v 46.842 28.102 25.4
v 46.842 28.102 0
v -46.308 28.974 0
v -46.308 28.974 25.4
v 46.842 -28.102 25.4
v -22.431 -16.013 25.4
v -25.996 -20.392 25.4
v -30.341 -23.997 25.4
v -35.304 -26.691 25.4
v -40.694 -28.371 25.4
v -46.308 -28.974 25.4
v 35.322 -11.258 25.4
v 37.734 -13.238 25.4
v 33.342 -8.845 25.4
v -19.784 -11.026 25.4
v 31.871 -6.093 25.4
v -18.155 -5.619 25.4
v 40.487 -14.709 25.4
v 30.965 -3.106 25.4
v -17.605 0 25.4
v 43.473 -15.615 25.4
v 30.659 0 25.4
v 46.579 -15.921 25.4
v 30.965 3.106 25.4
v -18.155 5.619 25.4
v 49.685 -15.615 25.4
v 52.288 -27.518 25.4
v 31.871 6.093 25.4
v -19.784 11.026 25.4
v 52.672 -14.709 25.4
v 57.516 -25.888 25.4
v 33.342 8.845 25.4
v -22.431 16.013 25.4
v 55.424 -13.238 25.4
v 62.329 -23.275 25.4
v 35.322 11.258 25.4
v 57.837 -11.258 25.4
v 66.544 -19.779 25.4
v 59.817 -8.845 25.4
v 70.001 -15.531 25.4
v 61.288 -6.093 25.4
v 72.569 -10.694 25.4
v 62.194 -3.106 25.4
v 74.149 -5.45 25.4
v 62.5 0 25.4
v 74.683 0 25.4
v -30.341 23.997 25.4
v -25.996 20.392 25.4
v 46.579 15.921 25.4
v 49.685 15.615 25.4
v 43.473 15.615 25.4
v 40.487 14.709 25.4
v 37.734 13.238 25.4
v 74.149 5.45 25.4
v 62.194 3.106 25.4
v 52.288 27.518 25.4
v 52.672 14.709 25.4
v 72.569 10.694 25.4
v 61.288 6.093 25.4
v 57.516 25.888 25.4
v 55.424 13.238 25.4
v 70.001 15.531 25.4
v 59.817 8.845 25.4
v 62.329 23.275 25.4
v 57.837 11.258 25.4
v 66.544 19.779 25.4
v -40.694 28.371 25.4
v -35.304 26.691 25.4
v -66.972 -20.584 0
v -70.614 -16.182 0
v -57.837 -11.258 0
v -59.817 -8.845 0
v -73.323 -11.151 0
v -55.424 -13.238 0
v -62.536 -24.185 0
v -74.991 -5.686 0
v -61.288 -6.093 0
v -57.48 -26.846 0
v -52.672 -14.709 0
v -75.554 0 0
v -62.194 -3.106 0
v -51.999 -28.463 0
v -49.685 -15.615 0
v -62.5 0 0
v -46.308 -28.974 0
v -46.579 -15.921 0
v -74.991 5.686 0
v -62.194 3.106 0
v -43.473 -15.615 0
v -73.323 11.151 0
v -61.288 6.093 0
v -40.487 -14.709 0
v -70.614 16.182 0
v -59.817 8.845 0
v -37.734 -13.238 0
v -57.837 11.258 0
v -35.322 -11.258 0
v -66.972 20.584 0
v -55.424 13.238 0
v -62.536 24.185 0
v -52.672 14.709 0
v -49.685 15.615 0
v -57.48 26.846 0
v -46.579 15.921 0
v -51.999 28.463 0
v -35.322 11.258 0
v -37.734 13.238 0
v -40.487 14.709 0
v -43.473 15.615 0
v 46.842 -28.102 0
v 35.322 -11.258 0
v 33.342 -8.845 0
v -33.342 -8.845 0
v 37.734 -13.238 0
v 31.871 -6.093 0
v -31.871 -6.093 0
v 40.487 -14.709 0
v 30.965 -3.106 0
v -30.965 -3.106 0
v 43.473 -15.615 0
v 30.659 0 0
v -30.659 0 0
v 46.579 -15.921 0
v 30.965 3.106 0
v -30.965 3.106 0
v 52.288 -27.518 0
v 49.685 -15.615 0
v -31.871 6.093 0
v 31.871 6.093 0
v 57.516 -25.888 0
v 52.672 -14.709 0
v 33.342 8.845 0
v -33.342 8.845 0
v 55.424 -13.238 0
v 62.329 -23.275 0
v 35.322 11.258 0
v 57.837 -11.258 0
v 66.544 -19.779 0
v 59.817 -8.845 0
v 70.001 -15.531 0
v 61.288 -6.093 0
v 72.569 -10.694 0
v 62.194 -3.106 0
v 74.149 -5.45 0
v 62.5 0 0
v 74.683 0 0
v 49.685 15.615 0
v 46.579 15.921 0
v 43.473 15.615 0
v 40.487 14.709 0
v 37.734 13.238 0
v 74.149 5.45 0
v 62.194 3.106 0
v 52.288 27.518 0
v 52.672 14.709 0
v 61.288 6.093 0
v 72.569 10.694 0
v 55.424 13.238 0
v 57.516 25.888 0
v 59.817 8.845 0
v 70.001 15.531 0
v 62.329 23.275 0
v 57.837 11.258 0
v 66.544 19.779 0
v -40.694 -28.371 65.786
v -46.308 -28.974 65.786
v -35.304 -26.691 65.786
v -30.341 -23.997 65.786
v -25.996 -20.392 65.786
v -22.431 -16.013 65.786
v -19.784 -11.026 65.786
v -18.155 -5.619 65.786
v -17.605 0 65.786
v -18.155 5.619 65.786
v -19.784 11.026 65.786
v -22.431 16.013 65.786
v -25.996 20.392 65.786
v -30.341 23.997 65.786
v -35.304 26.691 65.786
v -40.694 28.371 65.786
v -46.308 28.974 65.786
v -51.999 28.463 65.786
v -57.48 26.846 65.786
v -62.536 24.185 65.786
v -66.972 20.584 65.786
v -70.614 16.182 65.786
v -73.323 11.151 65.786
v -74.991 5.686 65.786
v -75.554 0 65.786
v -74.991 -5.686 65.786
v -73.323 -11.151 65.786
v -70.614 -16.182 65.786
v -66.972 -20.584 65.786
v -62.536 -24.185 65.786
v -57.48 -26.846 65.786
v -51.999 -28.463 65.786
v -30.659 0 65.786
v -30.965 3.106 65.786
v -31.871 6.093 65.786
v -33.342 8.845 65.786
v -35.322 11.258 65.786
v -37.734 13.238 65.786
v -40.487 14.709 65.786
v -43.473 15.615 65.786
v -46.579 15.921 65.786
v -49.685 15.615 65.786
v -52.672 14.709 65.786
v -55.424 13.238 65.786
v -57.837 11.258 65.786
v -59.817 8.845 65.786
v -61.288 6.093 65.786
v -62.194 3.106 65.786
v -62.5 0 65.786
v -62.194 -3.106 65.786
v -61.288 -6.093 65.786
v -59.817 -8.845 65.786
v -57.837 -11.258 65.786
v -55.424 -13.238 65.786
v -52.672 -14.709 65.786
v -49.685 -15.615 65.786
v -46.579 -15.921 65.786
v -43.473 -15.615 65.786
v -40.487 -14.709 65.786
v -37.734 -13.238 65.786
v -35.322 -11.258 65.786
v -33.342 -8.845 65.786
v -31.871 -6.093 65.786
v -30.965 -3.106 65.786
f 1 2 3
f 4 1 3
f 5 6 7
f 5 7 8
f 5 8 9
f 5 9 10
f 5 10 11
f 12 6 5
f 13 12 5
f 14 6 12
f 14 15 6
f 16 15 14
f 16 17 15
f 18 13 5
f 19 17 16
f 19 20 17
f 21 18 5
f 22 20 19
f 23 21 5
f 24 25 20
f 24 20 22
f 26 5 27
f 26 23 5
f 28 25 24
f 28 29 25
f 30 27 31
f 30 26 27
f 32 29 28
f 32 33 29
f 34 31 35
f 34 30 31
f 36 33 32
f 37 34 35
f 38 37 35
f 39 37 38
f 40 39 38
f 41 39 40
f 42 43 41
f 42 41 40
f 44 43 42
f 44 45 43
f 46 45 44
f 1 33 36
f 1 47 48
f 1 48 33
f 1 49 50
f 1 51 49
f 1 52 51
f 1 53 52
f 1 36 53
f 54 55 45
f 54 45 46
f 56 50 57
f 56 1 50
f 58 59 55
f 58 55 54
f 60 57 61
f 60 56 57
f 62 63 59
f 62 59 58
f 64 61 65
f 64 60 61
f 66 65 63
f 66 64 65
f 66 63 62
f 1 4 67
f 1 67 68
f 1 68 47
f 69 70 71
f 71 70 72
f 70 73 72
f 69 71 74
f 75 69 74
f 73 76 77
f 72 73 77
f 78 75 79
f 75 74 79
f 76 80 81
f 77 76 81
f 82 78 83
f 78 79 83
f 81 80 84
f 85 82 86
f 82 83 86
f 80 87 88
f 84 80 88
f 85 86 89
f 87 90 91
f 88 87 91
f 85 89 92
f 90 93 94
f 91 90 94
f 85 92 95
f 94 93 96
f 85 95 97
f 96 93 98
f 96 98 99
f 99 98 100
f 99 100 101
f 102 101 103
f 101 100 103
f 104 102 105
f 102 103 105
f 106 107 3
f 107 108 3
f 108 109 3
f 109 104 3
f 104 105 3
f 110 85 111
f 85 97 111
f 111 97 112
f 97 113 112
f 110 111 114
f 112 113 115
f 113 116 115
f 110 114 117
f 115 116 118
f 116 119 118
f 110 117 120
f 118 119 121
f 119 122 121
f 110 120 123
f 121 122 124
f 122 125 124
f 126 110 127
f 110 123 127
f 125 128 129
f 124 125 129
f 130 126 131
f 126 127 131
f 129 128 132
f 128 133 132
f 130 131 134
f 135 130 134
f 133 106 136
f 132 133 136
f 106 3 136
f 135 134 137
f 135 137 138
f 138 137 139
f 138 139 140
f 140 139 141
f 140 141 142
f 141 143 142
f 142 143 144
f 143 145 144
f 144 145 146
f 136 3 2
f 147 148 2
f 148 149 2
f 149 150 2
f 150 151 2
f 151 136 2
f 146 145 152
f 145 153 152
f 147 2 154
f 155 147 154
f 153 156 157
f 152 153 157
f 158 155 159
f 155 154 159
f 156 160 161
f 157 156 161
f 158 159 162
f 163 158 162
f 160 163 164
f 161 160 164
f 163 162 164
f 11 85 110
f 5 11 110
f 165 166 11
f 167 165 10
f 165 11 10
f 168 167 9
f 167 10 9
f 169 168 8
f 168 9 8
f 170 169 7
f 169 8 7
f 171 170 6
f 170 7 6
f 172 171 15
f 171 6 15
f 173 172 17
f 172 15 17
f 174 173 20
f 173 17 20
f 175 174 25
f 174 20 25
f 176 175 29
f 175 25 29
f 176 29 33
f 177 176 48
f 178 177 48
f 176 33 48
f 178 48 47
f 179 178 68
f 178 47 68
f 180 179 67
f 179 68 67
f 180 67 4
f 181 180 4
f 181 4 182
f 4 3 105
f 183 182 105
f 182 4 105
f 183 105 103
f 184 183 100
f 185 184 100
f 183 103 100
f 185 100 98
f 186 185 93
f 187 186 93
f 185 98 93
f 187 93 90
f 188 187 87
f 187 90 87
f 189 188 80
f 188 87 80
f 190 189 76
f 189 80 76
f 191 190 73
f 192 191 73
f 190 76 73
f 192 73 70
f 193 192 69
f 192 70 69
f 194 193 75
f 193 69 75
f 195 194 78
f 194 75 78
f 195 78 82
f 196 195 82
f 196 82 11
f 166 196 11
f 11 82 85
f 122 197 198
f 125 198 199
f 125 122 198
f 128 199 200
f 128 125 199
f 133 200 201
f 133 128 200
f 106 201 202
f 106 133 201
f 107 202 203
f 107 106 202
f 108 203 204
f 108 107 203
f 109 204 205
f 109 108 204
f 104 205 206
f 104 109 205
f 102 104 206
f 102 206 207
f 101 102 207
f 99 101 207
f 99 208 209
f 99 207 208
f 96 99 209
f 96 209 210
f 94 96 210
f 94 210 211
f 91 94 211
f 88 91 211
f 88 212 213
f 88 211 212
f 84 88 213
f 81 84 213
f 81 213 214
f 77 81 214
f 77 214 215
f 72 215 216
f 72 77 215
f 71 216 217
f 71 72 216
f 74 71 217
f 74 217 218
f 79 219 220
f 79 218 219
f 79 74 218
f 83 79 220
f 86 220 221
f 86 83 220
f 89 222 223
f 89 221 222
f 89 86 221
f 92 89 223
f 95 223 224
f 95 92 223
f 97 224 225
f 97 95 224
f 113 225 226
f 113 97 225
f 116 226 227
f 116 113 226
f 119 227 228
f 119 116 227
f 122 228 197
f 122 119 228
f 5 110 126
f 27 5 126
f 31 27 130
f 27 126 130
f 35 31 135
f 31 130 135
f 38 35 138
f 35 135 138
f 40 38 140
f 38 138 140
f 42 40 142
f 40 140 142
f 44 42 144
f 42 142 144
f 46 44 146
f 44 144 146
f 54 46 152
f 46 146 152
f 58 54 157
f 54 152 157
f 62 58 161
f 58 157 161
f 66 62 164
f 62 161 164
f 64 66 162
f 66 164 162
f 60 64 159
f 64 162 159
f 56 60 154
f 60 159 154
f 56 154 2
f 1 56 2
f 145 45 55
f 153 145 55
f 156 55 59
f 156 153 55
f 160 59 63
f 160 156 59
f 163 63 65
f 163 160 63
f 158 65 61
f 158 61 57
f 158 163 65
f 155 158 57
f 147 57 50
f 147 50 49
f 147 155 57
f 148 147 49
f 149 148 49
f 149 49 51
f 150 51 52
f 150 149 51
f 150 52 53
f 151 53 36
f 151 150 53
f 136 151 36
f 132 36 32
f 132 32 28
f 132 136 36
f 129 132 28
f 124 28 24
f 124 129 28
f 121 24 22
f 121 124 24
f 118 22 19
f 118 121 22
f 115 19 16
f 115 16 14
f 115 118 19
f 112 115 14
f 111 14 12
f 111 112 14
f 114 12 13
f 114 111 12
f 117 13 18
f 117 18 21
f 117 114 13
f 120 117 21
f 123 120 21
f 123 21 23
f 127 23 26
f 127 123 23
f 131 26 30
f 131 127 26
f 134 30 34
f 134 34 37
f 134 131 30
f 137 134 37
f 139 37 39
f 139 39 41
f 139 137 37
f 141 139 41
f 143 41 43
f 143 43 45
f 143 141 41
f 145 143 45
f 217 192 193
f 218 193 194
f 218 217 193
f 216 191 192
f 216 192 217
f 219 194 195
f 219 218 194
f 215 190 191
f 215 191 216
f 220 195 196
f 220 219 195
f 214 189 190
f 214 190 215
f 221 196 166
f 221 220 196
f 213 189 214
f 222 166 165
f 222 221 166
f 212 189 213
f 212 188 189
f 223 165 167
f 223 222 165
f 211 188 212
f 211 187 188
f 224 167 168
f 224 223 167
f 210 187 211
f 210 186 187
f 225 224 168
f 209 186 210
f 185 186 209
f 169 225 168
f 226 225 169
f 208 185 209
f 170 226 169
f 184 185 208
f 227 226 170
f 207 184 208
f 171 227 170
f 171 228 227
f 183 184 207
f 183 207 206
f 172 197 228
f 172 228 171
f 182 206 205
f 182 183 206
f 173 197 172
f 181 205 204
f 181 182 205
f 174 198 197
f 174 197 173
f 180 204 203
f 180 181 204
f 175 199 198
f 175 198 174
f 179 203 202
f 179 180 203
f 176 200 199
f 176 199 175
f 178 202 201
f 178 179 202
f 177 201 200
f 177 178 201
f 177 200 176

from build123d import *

# Parameters (mm, degrees)
F0_R     = 15.920661
F1_DEPTH = 25.4
F2_DEPTH = 65.786
F3_DEPTH = 76.2
F4_DEPTH = 61.214


with BuildPart() as f1:
    # F0 (on Top) → F1 (new body)
    with BuildSketch(Plane.XY):
        with Locations((46.579406, 0)):
            Circle(F0_R)
        with BuildLine():
            Line((46.842293, 28.102132), (-46.308367, 28.973528))
            ThreePointArc((-46.308367, 28.973528), (-17.604609, 0), (-46.308367, -28.973528))
            Line((-46.308367, -28.973528), (46.842293, -28.102132))
            ThreePointArc((46.842293, -28.102132), (74.682768, 0), (46.842293, 28.102132))
        make_face()
        with Locations((46.579406, 0)):
            Circle(F0_R, mode=Mode.SUBTRACT)
        with BuildLine():
            ThreePointArc((-46.308367, -28.973528), (-17.604609, 0), (-46.308367, 28.973528))
            ThreePointArc((-46.308367, 28.973528), (-75.554202, 0), (-46.308367, -28.973528))
        make_face()
        with Locations((-46.579406, 0)):
            Circle(F0_R, mode=Mode.SUBTRACT)
        with Locations((-46.579406, 0)):
            Circle(F0_R)
    extrude(amount=F1_DEPTH)

    # F0 (on Top) → F2 (join)
    with BuildSketch(Plane.XY):
        with BuildLine():
            ThreePointArc((-46.308367, -28.973528), (-17.604609, 0), (-46.308367, 28.973528))
            ThreePointArc((-46.308367, 28.973528), (-75.554202, 0), (-46.308367, -28.973528))
        make_face()
        with Locations((-46.579406, 0)):
            Circle(F0_R, mode=Mode.SUBTRACT)
        with Locations((-46.579406, 0)):
            Circle(F0_R)
    extrude(amount=F2_DEPTH)

    # F0 (on Top) → F3 (cut)
    with BuildSketch(Plane.XY):
        with Locations((-46.579406, 0)):
            Circle(F0_R)
    extrude(amount=F3_DEPTH, mode=Mode.SUBTRACT)

    # F0 (on Top) → F4 (cut)
    with BuildSketch(Plane.XY):
        with Locations((46.579406, 0)):
            Circle(F0_R)
    extrude(amount=F4_DEPTH, mode=Mode.SUBTRACT)


solid = f1.part
